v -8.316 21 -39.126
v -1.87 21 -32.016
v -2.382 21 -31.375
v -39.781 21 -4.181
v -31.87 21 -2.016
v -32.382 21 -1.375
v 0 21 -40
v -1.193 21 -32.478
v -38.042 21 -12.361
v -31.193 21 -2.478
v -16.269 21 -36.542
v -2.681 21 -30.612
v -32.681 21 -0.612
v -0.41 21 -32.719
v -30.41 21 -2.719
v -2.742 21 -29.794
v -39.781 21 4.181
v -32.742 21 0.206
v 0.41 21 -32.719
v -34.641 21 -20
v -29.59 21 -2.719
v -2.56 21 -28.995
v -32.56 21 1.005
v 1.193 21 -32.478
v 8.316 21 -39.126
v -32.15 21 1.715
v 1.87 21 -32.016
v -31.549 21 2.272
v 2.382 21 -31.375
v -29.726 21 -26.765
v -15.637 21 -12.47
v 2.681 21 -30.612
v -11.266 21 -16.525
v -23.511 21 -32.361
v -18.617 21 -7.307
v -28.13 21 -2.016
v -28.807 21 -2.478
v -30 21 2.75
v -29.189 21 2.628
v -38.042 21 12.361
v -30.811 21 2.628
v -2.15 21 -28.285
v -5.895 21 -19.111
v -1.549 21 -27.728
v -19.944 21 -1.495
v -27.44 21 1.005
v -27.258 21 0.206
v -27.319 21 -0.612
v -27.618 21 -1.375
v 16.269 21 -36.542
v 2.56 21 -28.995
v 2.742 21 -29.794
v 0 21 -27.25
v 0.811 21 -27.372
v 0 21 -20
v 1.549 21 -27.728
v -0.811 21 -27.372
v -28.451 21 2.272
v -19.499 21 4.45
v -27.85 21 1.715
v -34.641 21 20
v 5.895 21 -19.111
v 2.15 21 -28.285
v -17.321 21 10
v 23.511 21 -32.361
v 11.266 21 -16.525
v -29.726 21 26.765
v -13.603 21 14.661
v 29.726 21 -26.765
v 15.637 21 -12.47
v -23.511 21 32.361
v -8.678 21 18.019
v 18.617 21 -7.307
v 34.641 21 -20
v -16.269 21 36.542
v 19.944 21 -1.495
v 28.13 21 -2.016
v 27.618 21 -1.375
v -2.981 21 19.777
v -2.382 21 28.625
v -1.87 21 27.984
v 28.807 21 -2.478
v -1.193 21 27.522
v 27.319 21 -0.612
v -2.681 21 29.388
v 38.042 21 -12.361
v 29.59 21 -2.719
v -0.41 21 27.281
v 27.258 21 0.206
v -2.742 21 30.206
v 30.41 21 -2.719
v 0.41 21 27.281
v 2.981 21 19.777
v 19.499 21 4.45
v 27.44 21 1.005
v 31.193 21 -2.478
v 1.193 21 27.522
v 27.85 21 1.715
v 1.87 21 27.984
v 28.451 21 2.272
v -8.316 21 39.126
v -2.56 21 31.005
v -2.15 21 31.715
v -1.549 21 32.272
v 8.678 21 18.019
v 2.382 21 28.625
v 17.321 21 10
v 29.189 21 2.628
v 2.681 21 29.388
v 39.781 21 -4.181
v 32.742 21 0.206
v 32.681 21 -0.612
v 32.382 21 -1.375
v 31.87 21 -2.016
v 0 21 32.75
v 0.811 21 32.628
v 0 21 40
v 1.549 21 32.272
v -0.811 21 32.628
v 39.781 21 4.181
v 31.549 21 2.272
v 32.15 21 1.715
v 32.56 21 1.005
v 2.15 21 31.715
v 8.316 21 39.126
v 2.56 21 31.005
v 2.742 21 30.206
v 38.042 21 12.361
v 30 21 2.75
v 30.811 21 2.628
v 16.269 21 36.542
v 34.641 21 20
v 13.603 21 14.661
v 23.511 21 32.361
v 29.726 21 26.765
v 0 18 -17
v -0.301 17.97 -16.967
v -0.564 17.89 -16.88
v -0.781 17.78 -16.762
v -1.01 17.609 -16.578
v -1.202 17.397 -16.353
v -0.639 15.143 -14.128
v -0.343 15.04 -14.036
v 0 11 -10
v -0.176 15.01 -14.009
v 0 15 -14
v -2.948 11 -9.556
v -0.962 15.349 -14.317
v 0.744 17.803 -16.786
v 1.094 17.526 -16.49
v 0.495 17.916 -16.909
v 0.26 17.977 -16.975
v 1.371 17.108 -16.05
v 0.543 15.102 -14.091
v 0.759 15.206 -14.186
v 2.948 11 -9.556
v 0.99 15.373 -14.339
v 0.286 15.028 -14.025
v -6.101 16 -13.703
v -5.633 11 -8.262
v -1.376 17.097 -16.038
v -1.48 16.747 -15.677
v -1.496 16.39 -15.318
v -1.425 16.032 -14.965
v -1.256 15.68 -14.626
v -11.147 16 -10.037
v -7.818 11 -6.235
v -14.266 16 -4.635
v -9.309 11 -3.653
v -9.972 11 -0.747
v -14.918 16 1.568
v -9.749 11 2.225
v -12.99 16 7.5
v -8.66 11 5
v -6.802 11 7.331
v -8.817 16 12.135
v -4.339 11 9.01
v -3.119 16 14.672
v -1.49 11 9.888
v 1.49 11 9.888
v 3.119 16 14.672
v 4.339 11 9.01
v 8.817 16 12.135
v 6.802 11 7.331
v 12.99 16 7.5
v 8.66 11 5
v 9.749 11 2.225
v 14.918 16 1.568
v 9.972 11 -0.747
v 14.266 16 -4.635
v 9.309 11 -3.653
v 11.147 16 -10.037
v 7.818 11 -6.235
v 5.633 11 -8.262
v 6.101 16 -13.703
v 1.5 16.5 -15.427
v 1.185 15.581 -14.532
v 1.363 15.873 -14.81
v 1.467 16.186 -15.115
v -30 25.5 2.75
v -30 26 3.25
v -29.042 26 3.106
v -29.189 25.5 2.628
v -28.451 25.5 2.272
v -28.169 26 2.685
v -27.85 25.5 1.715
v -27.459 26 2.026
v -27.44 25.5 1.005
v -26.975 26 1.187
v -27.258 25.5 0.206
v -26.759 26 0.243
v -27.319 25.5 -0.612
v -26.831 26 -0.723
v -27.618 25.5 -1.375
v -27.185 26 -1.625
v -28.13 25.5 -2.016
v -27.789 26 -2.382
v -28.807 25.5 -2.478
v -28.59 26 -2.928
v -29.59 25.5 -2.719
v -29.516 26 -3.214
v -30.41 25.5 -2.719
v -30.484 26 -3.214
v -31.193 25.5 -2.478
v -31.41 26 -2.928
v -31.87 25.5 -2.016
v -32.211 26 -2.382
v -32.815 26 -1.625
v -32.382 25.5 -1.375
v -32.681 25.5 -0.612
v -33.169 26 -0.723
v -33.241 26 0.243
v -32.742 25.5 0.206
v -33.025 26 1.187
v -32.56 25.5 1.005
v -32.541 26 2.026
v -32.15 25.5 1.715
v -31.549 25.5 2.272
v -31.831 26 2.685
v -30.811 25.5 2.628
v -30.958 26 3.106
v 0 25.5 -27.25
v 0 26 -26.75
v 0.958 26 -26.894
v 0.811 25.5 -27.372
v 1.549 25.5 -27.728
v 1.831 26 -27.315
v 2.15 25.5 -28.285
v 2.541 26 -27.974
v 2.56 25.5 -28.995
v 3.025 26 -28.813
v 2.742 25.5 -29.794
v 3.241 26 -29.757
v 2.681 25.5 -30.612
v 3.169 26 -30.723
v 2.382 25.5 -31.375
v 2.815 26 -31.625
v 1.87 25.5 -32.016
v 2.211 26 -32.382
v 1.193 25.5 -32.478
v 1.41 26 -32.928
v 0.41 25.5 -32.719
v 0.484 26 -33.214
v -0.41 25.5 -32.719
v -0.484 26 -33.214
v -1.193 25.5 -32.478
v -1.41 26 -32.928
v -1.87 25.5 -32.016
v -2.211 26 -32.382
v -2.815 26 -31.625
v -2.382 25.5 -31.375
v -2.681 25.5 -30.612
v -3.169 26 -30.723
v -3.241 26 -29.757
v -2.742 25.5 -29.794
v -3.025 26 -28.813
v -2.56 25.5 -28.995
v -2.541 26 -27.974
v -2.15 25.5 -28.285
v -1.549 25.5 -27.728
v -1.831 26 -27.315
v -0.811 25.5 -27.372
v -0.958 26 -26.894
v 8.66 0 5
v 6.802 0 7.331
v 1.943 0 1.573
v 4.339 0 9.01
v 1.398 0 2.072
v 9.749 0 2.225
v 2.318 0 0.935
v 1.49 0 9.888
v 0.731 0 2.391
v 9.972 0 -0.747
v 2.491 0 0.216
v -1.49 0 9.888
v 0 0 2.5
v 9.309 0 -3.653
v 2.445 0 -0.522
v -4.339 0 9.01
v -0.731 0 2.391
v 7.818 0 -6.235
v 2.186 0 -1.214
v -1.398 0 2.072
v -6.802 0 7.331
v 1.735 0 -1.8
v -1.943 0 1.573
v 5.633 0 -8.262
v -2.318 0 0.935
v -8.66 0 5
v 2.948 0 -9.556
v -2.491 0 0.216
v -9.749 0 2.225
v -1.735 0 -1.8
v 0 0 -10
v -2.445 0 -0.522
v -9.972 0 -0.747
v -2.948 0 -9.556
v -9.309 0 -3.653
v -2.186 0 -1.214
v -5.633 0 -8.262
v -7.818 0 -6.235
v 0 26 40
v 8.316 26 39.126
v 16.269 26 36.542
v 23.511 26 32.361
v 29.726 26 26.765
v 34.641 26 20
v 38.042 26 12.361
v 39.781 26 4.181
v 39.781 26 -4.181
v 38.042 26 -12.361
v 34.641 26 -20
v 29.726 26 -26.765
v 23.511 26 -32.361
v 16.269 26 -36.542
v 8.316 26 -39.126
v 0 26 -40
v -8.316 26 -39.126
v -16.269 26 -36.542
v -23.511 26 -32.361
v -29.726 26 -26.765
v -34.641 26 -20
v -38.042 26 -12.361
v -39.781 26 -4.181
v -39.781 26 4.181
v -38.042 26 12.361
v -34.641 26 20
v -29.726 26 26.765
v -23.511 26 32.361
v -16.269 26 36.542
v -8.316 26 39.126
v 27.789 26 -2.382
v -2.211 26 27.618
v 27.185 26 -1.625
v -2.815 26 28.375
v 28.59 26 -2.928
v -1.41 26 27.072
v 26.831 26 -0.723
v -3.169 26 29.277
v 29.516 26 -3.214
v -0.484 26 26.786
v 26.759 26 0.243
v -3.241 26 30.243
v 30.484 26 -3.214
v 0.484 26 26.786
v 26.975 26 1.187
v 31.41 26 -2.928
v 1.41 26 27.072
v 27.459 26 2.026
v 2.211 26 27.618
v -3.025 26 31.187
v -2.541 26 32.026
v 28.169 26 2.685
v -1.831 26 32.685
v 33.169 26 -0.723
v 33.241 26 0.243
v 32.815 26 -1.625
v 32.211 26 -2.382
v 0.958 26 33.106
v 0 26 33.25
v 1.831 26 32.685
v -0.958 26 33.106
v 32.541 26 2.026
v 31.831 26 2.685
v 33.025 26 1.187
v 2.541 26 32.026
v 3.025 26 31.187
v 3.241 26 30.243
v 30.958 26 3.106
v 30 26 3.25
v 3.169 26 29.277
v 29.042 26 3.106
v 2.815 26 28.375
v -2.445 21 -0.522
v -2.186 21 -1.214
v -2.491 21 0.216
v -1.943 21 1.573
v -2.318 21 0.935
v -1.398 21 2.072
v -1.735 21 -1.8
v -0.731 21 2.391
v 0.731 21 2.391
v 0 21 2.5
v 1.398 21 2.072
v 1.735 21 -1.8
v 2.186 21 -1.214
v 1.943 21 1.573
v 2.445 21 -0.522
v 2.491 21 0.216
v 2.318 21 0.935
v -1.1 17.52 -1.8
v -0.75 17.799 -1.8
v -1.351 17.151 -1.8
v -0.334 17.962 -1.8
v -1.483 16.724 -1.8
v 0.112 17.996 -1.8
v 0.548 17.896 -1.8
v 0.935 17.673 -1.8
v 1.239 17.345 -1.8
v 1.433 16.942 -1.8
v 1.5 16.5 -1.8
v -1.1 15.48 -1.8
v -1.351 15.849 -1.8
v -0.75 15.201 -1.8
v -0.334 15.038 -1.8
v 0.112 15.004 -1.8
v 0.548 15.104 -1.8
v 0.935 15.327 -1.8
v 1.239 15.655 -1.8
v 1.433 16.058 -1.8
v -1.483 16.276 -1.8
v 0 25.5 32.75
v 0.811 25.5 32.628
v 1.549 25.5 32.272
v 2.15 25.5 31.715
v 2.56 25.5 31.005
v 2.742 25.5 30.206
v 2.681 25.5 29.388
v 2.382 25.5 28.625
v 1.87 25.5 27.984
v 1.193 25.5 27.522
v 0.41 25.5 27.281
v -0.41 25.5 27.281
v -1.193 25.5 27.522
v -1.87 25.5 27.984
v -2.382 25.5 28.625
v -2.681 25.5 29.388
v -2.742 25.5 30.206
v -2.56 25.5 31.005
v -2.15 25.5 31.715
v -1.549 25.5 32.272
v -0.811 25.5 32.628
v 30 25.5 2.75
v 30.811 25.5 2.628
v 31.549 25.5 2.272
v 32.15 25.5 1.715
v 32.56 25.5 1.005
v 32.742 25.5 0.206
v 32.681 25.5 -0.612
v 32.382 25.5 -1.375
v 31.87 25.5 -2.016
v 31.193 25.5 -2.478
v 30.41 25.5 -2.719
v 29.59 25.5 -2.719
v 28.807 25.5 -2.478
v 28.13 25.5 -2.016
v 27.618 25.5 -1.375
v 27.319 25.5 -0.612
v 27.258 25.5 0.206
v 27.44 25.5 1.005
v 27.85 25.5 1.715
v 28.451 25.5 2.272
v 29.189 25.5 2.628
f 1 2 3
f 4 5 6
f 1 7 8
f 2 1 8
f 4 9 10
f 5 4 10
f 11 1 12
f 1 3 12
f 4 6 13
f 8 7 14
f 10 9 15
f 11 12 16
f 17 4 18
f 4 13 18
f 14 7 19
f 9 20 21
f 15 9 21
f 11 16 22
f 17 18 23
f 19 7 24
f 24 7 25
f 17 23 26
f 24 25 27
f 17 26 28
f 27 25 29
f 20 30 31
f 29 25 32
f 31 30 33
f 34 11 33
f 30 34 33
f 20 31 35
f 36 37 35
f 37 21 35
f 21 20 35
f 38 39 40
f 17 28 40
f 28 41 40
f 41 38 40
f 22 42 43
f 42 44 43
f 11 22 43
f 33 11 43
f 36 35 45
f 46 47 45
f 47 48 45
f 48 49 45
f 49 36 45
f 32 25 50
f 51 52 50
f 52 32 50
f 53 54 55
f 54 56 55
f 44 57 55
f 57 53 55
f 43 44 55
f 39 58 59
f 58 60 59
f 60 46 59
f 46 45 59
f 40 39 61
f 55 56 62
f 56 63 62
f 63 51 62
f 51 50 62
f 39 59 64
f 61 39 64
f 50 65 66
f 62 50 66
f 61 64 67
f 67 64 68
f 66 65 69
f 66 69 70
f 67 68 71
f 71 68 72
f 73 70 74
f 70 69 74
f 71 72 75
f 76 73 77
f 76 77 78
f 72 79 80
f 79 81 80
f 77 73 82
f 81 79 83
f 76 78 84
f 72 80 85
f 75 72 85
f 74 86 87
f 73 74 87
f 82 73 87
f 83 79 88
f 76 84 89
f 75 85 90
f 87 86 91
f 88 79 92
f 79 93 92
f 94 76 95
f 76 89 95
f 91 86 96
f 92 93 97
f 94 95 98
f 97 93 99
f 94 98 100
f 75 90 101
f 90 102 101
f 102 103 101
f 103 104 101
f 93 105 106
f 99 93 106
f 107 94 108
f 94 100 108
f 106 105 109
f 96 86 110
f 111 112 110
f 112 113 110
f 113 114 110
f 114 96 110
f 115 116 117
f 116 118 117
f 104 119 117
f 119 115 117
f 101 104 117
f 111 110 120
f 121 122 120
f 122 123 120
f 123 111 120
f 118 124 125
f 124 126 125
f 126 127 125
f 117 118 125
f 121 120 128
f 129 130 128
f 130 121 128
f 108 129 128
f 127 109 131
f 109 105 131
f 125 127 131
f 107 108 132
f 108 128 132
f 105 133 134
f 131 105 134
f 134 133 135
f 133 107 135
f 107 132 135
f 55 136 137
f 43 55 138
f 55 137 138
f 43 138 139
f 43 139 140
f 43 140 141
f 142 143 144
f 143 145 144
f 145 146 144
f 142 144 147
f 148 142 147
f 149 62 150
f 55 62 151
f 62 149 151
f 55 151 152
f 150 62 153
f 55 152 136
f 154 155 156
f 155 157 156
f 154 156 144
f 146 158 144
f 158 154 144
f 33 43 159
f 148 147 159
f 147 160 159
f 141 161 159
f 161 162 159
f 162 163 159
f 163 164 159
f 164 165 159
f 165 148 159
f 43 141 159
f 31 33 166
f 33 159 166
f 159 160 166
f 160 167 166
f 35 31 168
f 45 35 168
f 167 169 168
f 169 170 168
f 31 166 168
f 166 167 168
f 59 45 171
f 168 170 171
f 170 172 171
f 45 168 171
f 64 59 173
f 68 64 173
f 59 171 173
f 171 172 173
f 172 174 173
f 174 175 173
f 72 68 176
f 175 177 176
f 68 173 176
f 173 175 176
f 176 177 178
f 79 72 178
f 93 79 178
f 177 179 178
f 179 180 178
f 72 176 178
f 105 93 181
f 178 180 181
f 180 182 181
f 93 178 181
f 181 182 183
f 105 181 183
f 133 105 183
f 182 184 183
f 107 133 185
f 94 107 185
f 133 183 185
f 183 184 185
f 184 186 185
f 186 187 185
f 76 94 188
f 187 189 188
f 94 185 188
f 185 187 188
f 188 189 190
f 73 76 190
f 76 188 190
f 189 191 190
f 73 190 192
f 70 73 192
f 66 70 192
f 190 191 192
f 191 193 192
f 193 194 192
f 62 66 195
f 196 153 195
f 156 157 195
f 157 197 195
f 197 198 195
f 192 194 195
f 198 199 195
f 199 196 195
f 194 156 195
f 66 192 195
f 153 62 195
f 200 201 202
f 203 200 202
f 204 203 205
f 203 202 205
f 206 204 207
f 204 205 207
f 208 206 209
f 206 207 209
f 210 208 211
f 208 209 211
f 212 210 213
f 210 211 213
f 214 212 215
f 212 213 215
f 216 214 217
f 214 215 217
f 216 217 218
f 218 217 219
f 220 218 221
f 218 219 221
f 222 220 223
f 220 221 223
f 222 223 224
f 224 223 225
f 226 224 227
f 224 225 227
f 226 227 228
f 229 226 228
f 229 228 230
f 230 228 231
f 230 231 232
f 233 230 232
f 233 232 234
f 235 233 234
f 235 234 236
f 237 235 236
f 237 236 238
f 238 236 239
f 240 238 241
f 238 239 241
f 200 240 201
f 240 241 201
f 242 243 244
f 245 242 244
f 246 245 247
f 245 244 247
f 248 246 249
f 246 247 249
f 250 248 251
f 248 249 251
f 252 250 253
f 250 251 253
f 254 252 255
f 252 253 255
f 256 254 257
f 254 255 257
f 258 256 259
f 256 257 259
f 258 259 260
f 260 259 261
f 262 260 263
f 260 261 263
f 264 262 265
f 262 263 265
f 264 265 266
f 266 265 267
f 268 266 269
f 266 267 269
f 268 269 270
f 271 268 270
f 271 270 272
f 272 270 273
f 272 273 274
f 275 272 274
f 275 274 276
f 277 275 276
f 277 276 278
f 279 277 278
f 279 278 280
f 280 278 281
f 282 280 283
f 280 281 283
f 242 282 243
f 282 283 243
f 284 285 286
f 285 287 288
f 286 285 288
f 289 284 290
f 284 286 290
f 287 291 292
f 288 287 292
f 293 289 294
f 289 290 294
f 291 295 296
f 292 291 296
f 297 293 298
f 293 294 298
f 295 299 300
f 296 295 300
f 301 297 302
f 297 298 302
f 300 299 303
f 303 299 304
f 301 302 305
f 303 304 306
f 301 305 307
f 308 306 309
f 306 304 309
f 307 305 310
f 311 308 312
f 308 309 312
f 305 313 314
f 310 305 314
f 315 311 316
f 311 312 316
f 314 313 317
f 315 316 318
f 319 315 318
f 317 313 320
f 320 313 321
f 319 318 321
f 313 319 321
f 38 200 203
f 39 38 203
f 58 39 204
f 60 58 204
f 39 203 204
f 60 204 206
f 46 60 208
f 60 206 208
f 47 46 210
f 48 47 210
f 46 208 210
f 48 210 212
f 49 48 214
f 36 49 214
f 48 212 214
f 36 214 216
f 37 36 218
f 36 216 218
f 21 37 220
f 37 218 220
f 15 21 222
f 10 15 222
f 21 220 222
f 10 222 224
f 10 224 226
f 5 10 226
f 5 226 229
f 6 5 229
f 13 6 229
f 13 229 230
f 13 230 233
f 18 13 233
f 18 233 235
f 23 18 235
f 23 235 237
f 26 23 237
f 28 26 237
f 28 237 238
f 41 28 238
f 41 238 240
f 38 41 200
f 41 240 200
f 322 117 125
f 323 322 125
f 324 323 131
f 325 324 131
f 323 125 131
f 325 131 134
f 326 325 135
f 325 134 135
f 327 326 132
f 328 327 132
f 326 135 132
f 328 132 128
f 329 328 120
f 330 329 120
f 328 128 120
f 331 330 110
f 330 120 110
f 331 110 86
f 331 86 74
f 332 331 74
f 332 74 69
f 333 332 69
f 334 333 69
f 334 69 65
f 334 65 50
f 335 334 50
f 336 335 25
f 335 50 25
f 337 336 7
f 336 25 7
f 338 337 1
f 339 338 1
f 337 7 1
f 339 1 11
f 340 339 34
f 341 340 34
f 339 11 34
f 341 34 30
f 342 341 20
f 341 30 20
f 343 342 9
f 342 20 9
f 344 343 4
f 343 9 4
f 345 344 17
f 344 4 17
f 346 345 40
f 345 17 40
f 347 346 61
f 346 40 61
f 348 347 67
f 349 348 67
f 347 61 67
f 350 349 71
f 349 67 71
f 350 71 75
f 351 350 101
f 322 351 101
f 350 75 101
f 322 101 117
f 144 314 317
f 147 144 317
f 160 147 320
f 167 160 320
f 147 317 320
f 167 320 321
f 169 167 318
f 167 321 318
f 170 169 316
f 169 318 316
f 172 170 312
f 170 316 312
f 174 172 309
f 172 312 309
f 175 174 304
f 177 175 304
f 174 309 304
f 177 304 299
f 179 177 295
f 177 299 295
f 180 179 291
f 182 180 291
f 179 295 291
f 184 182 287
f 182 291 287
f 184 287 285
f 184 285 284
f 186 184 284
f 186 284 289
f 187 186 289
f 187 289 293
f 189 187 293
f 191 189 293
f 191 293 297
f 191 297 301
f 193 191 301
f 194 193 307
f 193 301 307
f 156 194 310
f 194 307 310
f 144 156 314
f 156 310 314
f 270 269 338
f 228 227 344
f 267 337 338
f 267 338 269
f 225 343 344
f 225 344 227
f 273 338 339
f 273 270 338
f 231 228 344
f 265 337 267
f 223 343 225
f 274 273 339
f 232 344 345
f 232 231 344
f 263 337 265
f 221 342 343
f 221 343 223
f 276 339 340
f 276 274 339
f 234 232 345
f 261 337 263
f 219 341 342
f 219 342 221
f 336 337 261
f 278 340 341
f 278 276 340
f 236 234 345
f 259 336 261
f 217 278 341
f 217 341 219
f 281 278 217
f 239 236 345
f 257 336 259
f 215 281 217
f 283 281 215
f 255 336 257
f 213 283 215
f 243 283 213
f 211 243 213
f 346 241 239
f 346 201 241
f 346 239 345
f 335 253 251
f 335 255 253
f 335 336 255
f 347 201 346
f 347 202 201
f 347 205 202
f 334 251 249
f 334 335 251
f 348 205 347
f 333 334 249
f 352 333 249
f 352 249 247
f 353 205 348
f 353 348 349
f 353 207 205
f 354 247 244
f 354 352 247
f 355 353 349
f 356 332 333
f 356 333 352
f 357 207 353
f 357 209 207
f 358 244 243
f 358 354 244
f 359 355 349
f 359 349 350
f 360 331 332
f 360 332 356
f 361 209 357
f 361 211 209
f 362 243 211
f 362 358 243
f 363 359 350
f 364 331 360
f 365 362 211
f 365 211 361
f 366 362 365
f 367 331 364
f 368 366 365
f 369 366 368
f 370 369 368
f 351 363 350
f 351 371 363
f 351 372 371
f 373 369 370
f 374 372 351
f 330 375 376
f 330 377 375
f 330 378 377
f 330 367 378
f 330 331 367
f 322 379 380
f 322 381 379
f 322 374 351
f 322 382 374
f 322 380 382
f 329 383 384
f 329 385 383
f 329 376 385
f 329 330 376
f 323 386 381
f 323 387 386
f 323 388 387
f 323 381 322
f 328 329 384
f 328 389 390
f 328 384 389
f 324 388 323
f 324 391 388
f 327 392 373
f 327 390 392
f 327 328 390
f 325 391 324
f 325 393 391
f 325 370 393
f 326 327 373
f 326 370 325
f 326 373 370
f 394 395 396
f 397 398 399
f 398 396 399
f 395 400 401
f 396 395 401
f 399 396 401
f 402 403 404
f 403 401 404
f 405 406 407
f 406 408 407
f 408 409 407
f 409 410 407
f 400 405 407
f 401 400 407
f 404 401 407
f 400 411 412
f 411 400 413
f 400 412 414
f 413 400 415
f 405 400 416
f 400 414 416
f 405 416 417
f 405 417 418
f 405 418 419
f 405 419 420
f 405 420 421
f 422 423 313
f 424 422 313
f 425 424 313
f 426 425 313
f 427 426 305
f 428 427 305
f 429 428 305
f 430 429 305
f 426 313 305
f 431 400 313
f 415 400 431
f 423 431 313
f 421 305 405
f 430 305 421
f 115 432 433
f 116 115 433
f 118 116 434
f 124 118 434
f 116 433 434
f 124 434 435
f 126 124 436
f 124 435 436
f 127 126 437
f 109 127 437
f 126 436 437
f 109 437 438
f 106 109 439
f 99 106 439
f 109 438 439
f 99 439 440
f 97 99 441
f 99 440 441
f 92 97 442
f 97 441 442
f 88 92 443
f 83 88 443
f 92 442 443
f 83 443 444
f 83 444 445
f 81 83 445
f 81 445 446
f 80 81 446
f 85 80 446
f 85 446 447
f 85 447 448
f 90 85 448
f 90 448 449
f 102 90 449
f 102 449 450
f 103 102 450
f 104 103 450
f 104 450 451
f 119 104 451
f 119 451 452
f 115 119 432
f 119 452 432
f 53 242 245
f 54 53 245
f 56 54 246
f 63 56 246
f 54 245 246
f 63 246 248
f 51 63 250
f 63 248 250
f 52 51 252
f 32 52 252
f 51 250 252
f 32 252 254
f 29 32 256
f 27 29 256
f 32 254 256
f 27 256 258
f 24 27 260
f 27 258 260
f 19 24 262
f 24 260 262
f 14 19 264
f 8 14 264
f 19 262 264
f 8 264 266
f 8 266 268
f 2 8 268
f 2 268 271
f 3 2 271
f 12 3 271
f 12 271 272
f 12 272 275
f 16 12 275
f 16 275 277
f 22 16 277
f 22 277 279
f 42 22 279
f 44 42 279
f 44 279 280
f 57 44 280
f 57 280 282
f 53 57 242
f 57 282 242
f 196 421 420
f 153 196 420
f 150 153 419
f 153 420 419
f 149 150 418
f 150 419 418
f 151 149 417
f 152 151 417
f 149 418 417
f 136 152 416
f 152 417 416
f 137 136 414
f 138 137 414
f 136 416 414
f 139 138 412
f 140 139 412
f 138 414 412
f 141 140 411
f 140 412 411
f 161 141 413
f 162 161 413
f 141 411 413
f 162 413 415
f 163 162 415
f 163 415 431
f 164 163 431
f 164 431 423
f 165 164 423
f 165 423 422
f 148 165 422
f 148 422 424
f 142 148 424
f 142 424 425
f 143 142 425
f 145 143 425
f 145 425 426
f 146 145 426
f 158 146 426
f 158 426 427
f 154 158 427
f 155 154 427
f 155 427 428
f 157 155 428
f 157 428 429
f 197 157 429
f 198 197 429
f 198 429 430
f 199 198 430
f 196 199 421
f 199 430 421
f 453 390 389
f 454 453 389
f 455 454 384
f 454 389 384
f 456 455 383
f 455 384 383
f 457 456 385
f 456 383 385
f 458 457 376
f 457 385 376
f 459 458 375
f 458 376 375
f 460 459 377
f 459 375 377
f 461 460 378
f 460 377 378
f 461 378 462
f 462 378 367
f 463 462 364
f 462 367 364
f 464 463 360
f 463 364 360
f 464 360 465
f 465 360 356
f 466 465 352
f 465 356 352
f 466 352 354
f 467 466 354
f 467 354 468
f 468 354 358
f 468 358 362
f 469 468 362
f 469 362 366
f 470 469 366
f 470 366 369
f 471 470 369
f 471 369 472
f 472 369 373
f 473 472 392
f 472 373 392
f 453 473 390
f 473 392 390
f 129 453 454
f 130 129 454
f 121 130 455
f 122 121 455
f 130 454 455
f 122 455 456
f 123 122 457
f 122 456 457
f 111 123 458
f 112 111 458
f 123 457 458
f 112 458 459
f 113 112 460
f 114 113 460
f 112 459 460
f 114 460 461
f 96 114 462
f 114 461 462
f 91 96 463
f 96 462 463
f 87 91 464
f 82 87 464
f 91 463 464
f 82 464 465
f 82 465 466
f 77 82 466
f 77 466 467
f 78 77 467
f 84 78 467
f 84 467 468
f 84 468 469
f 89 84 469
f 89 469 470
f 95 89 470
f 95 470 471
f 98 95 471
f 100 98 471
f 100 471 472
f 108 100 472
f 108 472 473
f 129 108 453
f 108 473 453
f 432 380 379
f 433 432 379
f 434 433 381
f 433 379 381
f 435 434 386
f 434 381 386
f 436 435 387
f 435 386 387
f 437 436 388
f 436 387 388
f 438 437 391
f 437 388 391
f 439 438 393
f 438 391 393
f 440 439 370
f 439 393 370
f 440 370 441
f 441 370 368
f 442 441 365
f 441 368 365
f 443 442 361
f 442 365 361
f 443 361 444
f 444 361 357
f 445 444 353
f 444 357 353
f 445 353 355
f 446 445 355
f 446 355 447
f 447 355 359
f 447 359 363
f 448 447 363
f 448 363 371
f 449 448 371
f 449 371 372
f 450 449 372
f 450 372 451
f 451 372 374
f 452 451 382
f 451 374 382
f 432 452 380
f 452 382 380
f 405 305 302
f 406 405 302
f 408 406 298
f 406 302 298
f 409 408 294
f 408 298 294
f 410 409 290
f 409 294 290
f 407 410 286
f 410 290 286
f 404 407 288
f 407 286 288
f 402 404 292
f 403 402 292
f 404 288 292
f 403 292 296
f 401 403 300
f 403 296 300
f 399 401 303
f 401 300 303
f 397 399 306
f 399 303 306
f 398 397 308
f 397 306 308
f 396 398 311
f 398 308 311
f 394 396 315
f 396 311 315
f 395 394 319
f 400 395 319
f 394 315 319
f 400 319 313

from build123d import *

# Parameters (mm, degrees)
SKETCH_1_R          = 10
EXTRUDE_1_DEPTH     = 21
SKETCH_2_R          = 40
EXTRUDE_2_DEPTH     = 5
CHAMFER_1_SIZE      = 10
SKETCH_3_R          = 2.75
CUT_EXTRUDE_2_DEPTH = 5
CHAMFER_2_SIZE      = 0.5
SKETCH_4_R          = 1.5
CUT_EXTRUDE_3_DEPTH = 63.257529665


with BuildPart() as part:
    # 草图1 → 凸台-拉伸1 (new body)
    with BuildSketch(Plane(origin=(0, 0, 0), x_dir=(1, 0, 0), z_dir=(0, 1, 0))):
        with Locations(Location((0, 0, 0), (0, 0, 90))):
            Circle(SKETCH_1_R)
        with BuildLine():
            Line((-1.734935157, 1.8), (1.734935157, 1.8))
            ThreePointArc((1.734935157, 1.8), (0, -2.5), (-1.734935157, 1.8))
        make_face(mode=Mode.SUBTRACT)
    extrude(amount=EXTRUDE_1_DEPTH)

    # 草图2 → 凸台-拉伸2 (add)
    with BuildSketch(Plane(origin=(0, 21, 0), x_dir=(1, 0, 0), z_dir=(0, 1, 0))):
        with Locations(Location((0, 0, 0), (0, 0, 270))):
            Circle(SKETCH_2_R)
    extrude(amount=EXTRUDE_2_DEPTH)

    # 倒角1
    chamfer_1_edges = [part.edges().sort_by_distance(p)[0] for p in [
        (0, 21, 10),
    ]]
    chamfer(chamfer_1_edges, length=CHAMFER_1_SIZE)

    # 草图3 → 切除-拉伸2 (cut)
    with BuildSketch(Plane(origin=(0, 26, 0), x_dir=(1, 0, 0), z_dir=(0, 1, 0))):
        with Locations(Location((0, 30, 0), (0, 0, 270))):
            Circle(SKETCH_3_R)
        with Locations(Location((30, 0, 0), (0, 0, 270))):
            Circle(SKETCH_3_R)
        with Locations(Location((0, -30, 0), (0, 0, 270))):
            Circle(SKETCH_3_R)
        with Locations(Location((-30, 0, 0), (0, 0, 270))):
            Circle(SKETCH_3_R)
    extrude(amount=-CUT_EXTRUDE_2_DEPTH, mode=Mode.SUBTRACT)

    # 倒角2
    chamfer_2_edges = [part.edges().sort_by_distance(p)[0] for p in [
        (0, 26, -32.75),
        (30, 26, -2.75),
        (0, 26, 27.25),
        (-30, 26, -2.75),
    ]]
    chamfer(chamfer_2_edges, length=CHAMFER_2_SIZE)

    # 草图4 → 切除-拉伸3 (cut, through all)
    with BuildSketch(Plane.XY):
        with Locations((0, 16.5)):
            Circle(SKETCH_4_R)
    extrude(amount=-CUT_EXTRUDE_3_DEPTH, mode=Mode.SUBTRACT)


solid = part.part
